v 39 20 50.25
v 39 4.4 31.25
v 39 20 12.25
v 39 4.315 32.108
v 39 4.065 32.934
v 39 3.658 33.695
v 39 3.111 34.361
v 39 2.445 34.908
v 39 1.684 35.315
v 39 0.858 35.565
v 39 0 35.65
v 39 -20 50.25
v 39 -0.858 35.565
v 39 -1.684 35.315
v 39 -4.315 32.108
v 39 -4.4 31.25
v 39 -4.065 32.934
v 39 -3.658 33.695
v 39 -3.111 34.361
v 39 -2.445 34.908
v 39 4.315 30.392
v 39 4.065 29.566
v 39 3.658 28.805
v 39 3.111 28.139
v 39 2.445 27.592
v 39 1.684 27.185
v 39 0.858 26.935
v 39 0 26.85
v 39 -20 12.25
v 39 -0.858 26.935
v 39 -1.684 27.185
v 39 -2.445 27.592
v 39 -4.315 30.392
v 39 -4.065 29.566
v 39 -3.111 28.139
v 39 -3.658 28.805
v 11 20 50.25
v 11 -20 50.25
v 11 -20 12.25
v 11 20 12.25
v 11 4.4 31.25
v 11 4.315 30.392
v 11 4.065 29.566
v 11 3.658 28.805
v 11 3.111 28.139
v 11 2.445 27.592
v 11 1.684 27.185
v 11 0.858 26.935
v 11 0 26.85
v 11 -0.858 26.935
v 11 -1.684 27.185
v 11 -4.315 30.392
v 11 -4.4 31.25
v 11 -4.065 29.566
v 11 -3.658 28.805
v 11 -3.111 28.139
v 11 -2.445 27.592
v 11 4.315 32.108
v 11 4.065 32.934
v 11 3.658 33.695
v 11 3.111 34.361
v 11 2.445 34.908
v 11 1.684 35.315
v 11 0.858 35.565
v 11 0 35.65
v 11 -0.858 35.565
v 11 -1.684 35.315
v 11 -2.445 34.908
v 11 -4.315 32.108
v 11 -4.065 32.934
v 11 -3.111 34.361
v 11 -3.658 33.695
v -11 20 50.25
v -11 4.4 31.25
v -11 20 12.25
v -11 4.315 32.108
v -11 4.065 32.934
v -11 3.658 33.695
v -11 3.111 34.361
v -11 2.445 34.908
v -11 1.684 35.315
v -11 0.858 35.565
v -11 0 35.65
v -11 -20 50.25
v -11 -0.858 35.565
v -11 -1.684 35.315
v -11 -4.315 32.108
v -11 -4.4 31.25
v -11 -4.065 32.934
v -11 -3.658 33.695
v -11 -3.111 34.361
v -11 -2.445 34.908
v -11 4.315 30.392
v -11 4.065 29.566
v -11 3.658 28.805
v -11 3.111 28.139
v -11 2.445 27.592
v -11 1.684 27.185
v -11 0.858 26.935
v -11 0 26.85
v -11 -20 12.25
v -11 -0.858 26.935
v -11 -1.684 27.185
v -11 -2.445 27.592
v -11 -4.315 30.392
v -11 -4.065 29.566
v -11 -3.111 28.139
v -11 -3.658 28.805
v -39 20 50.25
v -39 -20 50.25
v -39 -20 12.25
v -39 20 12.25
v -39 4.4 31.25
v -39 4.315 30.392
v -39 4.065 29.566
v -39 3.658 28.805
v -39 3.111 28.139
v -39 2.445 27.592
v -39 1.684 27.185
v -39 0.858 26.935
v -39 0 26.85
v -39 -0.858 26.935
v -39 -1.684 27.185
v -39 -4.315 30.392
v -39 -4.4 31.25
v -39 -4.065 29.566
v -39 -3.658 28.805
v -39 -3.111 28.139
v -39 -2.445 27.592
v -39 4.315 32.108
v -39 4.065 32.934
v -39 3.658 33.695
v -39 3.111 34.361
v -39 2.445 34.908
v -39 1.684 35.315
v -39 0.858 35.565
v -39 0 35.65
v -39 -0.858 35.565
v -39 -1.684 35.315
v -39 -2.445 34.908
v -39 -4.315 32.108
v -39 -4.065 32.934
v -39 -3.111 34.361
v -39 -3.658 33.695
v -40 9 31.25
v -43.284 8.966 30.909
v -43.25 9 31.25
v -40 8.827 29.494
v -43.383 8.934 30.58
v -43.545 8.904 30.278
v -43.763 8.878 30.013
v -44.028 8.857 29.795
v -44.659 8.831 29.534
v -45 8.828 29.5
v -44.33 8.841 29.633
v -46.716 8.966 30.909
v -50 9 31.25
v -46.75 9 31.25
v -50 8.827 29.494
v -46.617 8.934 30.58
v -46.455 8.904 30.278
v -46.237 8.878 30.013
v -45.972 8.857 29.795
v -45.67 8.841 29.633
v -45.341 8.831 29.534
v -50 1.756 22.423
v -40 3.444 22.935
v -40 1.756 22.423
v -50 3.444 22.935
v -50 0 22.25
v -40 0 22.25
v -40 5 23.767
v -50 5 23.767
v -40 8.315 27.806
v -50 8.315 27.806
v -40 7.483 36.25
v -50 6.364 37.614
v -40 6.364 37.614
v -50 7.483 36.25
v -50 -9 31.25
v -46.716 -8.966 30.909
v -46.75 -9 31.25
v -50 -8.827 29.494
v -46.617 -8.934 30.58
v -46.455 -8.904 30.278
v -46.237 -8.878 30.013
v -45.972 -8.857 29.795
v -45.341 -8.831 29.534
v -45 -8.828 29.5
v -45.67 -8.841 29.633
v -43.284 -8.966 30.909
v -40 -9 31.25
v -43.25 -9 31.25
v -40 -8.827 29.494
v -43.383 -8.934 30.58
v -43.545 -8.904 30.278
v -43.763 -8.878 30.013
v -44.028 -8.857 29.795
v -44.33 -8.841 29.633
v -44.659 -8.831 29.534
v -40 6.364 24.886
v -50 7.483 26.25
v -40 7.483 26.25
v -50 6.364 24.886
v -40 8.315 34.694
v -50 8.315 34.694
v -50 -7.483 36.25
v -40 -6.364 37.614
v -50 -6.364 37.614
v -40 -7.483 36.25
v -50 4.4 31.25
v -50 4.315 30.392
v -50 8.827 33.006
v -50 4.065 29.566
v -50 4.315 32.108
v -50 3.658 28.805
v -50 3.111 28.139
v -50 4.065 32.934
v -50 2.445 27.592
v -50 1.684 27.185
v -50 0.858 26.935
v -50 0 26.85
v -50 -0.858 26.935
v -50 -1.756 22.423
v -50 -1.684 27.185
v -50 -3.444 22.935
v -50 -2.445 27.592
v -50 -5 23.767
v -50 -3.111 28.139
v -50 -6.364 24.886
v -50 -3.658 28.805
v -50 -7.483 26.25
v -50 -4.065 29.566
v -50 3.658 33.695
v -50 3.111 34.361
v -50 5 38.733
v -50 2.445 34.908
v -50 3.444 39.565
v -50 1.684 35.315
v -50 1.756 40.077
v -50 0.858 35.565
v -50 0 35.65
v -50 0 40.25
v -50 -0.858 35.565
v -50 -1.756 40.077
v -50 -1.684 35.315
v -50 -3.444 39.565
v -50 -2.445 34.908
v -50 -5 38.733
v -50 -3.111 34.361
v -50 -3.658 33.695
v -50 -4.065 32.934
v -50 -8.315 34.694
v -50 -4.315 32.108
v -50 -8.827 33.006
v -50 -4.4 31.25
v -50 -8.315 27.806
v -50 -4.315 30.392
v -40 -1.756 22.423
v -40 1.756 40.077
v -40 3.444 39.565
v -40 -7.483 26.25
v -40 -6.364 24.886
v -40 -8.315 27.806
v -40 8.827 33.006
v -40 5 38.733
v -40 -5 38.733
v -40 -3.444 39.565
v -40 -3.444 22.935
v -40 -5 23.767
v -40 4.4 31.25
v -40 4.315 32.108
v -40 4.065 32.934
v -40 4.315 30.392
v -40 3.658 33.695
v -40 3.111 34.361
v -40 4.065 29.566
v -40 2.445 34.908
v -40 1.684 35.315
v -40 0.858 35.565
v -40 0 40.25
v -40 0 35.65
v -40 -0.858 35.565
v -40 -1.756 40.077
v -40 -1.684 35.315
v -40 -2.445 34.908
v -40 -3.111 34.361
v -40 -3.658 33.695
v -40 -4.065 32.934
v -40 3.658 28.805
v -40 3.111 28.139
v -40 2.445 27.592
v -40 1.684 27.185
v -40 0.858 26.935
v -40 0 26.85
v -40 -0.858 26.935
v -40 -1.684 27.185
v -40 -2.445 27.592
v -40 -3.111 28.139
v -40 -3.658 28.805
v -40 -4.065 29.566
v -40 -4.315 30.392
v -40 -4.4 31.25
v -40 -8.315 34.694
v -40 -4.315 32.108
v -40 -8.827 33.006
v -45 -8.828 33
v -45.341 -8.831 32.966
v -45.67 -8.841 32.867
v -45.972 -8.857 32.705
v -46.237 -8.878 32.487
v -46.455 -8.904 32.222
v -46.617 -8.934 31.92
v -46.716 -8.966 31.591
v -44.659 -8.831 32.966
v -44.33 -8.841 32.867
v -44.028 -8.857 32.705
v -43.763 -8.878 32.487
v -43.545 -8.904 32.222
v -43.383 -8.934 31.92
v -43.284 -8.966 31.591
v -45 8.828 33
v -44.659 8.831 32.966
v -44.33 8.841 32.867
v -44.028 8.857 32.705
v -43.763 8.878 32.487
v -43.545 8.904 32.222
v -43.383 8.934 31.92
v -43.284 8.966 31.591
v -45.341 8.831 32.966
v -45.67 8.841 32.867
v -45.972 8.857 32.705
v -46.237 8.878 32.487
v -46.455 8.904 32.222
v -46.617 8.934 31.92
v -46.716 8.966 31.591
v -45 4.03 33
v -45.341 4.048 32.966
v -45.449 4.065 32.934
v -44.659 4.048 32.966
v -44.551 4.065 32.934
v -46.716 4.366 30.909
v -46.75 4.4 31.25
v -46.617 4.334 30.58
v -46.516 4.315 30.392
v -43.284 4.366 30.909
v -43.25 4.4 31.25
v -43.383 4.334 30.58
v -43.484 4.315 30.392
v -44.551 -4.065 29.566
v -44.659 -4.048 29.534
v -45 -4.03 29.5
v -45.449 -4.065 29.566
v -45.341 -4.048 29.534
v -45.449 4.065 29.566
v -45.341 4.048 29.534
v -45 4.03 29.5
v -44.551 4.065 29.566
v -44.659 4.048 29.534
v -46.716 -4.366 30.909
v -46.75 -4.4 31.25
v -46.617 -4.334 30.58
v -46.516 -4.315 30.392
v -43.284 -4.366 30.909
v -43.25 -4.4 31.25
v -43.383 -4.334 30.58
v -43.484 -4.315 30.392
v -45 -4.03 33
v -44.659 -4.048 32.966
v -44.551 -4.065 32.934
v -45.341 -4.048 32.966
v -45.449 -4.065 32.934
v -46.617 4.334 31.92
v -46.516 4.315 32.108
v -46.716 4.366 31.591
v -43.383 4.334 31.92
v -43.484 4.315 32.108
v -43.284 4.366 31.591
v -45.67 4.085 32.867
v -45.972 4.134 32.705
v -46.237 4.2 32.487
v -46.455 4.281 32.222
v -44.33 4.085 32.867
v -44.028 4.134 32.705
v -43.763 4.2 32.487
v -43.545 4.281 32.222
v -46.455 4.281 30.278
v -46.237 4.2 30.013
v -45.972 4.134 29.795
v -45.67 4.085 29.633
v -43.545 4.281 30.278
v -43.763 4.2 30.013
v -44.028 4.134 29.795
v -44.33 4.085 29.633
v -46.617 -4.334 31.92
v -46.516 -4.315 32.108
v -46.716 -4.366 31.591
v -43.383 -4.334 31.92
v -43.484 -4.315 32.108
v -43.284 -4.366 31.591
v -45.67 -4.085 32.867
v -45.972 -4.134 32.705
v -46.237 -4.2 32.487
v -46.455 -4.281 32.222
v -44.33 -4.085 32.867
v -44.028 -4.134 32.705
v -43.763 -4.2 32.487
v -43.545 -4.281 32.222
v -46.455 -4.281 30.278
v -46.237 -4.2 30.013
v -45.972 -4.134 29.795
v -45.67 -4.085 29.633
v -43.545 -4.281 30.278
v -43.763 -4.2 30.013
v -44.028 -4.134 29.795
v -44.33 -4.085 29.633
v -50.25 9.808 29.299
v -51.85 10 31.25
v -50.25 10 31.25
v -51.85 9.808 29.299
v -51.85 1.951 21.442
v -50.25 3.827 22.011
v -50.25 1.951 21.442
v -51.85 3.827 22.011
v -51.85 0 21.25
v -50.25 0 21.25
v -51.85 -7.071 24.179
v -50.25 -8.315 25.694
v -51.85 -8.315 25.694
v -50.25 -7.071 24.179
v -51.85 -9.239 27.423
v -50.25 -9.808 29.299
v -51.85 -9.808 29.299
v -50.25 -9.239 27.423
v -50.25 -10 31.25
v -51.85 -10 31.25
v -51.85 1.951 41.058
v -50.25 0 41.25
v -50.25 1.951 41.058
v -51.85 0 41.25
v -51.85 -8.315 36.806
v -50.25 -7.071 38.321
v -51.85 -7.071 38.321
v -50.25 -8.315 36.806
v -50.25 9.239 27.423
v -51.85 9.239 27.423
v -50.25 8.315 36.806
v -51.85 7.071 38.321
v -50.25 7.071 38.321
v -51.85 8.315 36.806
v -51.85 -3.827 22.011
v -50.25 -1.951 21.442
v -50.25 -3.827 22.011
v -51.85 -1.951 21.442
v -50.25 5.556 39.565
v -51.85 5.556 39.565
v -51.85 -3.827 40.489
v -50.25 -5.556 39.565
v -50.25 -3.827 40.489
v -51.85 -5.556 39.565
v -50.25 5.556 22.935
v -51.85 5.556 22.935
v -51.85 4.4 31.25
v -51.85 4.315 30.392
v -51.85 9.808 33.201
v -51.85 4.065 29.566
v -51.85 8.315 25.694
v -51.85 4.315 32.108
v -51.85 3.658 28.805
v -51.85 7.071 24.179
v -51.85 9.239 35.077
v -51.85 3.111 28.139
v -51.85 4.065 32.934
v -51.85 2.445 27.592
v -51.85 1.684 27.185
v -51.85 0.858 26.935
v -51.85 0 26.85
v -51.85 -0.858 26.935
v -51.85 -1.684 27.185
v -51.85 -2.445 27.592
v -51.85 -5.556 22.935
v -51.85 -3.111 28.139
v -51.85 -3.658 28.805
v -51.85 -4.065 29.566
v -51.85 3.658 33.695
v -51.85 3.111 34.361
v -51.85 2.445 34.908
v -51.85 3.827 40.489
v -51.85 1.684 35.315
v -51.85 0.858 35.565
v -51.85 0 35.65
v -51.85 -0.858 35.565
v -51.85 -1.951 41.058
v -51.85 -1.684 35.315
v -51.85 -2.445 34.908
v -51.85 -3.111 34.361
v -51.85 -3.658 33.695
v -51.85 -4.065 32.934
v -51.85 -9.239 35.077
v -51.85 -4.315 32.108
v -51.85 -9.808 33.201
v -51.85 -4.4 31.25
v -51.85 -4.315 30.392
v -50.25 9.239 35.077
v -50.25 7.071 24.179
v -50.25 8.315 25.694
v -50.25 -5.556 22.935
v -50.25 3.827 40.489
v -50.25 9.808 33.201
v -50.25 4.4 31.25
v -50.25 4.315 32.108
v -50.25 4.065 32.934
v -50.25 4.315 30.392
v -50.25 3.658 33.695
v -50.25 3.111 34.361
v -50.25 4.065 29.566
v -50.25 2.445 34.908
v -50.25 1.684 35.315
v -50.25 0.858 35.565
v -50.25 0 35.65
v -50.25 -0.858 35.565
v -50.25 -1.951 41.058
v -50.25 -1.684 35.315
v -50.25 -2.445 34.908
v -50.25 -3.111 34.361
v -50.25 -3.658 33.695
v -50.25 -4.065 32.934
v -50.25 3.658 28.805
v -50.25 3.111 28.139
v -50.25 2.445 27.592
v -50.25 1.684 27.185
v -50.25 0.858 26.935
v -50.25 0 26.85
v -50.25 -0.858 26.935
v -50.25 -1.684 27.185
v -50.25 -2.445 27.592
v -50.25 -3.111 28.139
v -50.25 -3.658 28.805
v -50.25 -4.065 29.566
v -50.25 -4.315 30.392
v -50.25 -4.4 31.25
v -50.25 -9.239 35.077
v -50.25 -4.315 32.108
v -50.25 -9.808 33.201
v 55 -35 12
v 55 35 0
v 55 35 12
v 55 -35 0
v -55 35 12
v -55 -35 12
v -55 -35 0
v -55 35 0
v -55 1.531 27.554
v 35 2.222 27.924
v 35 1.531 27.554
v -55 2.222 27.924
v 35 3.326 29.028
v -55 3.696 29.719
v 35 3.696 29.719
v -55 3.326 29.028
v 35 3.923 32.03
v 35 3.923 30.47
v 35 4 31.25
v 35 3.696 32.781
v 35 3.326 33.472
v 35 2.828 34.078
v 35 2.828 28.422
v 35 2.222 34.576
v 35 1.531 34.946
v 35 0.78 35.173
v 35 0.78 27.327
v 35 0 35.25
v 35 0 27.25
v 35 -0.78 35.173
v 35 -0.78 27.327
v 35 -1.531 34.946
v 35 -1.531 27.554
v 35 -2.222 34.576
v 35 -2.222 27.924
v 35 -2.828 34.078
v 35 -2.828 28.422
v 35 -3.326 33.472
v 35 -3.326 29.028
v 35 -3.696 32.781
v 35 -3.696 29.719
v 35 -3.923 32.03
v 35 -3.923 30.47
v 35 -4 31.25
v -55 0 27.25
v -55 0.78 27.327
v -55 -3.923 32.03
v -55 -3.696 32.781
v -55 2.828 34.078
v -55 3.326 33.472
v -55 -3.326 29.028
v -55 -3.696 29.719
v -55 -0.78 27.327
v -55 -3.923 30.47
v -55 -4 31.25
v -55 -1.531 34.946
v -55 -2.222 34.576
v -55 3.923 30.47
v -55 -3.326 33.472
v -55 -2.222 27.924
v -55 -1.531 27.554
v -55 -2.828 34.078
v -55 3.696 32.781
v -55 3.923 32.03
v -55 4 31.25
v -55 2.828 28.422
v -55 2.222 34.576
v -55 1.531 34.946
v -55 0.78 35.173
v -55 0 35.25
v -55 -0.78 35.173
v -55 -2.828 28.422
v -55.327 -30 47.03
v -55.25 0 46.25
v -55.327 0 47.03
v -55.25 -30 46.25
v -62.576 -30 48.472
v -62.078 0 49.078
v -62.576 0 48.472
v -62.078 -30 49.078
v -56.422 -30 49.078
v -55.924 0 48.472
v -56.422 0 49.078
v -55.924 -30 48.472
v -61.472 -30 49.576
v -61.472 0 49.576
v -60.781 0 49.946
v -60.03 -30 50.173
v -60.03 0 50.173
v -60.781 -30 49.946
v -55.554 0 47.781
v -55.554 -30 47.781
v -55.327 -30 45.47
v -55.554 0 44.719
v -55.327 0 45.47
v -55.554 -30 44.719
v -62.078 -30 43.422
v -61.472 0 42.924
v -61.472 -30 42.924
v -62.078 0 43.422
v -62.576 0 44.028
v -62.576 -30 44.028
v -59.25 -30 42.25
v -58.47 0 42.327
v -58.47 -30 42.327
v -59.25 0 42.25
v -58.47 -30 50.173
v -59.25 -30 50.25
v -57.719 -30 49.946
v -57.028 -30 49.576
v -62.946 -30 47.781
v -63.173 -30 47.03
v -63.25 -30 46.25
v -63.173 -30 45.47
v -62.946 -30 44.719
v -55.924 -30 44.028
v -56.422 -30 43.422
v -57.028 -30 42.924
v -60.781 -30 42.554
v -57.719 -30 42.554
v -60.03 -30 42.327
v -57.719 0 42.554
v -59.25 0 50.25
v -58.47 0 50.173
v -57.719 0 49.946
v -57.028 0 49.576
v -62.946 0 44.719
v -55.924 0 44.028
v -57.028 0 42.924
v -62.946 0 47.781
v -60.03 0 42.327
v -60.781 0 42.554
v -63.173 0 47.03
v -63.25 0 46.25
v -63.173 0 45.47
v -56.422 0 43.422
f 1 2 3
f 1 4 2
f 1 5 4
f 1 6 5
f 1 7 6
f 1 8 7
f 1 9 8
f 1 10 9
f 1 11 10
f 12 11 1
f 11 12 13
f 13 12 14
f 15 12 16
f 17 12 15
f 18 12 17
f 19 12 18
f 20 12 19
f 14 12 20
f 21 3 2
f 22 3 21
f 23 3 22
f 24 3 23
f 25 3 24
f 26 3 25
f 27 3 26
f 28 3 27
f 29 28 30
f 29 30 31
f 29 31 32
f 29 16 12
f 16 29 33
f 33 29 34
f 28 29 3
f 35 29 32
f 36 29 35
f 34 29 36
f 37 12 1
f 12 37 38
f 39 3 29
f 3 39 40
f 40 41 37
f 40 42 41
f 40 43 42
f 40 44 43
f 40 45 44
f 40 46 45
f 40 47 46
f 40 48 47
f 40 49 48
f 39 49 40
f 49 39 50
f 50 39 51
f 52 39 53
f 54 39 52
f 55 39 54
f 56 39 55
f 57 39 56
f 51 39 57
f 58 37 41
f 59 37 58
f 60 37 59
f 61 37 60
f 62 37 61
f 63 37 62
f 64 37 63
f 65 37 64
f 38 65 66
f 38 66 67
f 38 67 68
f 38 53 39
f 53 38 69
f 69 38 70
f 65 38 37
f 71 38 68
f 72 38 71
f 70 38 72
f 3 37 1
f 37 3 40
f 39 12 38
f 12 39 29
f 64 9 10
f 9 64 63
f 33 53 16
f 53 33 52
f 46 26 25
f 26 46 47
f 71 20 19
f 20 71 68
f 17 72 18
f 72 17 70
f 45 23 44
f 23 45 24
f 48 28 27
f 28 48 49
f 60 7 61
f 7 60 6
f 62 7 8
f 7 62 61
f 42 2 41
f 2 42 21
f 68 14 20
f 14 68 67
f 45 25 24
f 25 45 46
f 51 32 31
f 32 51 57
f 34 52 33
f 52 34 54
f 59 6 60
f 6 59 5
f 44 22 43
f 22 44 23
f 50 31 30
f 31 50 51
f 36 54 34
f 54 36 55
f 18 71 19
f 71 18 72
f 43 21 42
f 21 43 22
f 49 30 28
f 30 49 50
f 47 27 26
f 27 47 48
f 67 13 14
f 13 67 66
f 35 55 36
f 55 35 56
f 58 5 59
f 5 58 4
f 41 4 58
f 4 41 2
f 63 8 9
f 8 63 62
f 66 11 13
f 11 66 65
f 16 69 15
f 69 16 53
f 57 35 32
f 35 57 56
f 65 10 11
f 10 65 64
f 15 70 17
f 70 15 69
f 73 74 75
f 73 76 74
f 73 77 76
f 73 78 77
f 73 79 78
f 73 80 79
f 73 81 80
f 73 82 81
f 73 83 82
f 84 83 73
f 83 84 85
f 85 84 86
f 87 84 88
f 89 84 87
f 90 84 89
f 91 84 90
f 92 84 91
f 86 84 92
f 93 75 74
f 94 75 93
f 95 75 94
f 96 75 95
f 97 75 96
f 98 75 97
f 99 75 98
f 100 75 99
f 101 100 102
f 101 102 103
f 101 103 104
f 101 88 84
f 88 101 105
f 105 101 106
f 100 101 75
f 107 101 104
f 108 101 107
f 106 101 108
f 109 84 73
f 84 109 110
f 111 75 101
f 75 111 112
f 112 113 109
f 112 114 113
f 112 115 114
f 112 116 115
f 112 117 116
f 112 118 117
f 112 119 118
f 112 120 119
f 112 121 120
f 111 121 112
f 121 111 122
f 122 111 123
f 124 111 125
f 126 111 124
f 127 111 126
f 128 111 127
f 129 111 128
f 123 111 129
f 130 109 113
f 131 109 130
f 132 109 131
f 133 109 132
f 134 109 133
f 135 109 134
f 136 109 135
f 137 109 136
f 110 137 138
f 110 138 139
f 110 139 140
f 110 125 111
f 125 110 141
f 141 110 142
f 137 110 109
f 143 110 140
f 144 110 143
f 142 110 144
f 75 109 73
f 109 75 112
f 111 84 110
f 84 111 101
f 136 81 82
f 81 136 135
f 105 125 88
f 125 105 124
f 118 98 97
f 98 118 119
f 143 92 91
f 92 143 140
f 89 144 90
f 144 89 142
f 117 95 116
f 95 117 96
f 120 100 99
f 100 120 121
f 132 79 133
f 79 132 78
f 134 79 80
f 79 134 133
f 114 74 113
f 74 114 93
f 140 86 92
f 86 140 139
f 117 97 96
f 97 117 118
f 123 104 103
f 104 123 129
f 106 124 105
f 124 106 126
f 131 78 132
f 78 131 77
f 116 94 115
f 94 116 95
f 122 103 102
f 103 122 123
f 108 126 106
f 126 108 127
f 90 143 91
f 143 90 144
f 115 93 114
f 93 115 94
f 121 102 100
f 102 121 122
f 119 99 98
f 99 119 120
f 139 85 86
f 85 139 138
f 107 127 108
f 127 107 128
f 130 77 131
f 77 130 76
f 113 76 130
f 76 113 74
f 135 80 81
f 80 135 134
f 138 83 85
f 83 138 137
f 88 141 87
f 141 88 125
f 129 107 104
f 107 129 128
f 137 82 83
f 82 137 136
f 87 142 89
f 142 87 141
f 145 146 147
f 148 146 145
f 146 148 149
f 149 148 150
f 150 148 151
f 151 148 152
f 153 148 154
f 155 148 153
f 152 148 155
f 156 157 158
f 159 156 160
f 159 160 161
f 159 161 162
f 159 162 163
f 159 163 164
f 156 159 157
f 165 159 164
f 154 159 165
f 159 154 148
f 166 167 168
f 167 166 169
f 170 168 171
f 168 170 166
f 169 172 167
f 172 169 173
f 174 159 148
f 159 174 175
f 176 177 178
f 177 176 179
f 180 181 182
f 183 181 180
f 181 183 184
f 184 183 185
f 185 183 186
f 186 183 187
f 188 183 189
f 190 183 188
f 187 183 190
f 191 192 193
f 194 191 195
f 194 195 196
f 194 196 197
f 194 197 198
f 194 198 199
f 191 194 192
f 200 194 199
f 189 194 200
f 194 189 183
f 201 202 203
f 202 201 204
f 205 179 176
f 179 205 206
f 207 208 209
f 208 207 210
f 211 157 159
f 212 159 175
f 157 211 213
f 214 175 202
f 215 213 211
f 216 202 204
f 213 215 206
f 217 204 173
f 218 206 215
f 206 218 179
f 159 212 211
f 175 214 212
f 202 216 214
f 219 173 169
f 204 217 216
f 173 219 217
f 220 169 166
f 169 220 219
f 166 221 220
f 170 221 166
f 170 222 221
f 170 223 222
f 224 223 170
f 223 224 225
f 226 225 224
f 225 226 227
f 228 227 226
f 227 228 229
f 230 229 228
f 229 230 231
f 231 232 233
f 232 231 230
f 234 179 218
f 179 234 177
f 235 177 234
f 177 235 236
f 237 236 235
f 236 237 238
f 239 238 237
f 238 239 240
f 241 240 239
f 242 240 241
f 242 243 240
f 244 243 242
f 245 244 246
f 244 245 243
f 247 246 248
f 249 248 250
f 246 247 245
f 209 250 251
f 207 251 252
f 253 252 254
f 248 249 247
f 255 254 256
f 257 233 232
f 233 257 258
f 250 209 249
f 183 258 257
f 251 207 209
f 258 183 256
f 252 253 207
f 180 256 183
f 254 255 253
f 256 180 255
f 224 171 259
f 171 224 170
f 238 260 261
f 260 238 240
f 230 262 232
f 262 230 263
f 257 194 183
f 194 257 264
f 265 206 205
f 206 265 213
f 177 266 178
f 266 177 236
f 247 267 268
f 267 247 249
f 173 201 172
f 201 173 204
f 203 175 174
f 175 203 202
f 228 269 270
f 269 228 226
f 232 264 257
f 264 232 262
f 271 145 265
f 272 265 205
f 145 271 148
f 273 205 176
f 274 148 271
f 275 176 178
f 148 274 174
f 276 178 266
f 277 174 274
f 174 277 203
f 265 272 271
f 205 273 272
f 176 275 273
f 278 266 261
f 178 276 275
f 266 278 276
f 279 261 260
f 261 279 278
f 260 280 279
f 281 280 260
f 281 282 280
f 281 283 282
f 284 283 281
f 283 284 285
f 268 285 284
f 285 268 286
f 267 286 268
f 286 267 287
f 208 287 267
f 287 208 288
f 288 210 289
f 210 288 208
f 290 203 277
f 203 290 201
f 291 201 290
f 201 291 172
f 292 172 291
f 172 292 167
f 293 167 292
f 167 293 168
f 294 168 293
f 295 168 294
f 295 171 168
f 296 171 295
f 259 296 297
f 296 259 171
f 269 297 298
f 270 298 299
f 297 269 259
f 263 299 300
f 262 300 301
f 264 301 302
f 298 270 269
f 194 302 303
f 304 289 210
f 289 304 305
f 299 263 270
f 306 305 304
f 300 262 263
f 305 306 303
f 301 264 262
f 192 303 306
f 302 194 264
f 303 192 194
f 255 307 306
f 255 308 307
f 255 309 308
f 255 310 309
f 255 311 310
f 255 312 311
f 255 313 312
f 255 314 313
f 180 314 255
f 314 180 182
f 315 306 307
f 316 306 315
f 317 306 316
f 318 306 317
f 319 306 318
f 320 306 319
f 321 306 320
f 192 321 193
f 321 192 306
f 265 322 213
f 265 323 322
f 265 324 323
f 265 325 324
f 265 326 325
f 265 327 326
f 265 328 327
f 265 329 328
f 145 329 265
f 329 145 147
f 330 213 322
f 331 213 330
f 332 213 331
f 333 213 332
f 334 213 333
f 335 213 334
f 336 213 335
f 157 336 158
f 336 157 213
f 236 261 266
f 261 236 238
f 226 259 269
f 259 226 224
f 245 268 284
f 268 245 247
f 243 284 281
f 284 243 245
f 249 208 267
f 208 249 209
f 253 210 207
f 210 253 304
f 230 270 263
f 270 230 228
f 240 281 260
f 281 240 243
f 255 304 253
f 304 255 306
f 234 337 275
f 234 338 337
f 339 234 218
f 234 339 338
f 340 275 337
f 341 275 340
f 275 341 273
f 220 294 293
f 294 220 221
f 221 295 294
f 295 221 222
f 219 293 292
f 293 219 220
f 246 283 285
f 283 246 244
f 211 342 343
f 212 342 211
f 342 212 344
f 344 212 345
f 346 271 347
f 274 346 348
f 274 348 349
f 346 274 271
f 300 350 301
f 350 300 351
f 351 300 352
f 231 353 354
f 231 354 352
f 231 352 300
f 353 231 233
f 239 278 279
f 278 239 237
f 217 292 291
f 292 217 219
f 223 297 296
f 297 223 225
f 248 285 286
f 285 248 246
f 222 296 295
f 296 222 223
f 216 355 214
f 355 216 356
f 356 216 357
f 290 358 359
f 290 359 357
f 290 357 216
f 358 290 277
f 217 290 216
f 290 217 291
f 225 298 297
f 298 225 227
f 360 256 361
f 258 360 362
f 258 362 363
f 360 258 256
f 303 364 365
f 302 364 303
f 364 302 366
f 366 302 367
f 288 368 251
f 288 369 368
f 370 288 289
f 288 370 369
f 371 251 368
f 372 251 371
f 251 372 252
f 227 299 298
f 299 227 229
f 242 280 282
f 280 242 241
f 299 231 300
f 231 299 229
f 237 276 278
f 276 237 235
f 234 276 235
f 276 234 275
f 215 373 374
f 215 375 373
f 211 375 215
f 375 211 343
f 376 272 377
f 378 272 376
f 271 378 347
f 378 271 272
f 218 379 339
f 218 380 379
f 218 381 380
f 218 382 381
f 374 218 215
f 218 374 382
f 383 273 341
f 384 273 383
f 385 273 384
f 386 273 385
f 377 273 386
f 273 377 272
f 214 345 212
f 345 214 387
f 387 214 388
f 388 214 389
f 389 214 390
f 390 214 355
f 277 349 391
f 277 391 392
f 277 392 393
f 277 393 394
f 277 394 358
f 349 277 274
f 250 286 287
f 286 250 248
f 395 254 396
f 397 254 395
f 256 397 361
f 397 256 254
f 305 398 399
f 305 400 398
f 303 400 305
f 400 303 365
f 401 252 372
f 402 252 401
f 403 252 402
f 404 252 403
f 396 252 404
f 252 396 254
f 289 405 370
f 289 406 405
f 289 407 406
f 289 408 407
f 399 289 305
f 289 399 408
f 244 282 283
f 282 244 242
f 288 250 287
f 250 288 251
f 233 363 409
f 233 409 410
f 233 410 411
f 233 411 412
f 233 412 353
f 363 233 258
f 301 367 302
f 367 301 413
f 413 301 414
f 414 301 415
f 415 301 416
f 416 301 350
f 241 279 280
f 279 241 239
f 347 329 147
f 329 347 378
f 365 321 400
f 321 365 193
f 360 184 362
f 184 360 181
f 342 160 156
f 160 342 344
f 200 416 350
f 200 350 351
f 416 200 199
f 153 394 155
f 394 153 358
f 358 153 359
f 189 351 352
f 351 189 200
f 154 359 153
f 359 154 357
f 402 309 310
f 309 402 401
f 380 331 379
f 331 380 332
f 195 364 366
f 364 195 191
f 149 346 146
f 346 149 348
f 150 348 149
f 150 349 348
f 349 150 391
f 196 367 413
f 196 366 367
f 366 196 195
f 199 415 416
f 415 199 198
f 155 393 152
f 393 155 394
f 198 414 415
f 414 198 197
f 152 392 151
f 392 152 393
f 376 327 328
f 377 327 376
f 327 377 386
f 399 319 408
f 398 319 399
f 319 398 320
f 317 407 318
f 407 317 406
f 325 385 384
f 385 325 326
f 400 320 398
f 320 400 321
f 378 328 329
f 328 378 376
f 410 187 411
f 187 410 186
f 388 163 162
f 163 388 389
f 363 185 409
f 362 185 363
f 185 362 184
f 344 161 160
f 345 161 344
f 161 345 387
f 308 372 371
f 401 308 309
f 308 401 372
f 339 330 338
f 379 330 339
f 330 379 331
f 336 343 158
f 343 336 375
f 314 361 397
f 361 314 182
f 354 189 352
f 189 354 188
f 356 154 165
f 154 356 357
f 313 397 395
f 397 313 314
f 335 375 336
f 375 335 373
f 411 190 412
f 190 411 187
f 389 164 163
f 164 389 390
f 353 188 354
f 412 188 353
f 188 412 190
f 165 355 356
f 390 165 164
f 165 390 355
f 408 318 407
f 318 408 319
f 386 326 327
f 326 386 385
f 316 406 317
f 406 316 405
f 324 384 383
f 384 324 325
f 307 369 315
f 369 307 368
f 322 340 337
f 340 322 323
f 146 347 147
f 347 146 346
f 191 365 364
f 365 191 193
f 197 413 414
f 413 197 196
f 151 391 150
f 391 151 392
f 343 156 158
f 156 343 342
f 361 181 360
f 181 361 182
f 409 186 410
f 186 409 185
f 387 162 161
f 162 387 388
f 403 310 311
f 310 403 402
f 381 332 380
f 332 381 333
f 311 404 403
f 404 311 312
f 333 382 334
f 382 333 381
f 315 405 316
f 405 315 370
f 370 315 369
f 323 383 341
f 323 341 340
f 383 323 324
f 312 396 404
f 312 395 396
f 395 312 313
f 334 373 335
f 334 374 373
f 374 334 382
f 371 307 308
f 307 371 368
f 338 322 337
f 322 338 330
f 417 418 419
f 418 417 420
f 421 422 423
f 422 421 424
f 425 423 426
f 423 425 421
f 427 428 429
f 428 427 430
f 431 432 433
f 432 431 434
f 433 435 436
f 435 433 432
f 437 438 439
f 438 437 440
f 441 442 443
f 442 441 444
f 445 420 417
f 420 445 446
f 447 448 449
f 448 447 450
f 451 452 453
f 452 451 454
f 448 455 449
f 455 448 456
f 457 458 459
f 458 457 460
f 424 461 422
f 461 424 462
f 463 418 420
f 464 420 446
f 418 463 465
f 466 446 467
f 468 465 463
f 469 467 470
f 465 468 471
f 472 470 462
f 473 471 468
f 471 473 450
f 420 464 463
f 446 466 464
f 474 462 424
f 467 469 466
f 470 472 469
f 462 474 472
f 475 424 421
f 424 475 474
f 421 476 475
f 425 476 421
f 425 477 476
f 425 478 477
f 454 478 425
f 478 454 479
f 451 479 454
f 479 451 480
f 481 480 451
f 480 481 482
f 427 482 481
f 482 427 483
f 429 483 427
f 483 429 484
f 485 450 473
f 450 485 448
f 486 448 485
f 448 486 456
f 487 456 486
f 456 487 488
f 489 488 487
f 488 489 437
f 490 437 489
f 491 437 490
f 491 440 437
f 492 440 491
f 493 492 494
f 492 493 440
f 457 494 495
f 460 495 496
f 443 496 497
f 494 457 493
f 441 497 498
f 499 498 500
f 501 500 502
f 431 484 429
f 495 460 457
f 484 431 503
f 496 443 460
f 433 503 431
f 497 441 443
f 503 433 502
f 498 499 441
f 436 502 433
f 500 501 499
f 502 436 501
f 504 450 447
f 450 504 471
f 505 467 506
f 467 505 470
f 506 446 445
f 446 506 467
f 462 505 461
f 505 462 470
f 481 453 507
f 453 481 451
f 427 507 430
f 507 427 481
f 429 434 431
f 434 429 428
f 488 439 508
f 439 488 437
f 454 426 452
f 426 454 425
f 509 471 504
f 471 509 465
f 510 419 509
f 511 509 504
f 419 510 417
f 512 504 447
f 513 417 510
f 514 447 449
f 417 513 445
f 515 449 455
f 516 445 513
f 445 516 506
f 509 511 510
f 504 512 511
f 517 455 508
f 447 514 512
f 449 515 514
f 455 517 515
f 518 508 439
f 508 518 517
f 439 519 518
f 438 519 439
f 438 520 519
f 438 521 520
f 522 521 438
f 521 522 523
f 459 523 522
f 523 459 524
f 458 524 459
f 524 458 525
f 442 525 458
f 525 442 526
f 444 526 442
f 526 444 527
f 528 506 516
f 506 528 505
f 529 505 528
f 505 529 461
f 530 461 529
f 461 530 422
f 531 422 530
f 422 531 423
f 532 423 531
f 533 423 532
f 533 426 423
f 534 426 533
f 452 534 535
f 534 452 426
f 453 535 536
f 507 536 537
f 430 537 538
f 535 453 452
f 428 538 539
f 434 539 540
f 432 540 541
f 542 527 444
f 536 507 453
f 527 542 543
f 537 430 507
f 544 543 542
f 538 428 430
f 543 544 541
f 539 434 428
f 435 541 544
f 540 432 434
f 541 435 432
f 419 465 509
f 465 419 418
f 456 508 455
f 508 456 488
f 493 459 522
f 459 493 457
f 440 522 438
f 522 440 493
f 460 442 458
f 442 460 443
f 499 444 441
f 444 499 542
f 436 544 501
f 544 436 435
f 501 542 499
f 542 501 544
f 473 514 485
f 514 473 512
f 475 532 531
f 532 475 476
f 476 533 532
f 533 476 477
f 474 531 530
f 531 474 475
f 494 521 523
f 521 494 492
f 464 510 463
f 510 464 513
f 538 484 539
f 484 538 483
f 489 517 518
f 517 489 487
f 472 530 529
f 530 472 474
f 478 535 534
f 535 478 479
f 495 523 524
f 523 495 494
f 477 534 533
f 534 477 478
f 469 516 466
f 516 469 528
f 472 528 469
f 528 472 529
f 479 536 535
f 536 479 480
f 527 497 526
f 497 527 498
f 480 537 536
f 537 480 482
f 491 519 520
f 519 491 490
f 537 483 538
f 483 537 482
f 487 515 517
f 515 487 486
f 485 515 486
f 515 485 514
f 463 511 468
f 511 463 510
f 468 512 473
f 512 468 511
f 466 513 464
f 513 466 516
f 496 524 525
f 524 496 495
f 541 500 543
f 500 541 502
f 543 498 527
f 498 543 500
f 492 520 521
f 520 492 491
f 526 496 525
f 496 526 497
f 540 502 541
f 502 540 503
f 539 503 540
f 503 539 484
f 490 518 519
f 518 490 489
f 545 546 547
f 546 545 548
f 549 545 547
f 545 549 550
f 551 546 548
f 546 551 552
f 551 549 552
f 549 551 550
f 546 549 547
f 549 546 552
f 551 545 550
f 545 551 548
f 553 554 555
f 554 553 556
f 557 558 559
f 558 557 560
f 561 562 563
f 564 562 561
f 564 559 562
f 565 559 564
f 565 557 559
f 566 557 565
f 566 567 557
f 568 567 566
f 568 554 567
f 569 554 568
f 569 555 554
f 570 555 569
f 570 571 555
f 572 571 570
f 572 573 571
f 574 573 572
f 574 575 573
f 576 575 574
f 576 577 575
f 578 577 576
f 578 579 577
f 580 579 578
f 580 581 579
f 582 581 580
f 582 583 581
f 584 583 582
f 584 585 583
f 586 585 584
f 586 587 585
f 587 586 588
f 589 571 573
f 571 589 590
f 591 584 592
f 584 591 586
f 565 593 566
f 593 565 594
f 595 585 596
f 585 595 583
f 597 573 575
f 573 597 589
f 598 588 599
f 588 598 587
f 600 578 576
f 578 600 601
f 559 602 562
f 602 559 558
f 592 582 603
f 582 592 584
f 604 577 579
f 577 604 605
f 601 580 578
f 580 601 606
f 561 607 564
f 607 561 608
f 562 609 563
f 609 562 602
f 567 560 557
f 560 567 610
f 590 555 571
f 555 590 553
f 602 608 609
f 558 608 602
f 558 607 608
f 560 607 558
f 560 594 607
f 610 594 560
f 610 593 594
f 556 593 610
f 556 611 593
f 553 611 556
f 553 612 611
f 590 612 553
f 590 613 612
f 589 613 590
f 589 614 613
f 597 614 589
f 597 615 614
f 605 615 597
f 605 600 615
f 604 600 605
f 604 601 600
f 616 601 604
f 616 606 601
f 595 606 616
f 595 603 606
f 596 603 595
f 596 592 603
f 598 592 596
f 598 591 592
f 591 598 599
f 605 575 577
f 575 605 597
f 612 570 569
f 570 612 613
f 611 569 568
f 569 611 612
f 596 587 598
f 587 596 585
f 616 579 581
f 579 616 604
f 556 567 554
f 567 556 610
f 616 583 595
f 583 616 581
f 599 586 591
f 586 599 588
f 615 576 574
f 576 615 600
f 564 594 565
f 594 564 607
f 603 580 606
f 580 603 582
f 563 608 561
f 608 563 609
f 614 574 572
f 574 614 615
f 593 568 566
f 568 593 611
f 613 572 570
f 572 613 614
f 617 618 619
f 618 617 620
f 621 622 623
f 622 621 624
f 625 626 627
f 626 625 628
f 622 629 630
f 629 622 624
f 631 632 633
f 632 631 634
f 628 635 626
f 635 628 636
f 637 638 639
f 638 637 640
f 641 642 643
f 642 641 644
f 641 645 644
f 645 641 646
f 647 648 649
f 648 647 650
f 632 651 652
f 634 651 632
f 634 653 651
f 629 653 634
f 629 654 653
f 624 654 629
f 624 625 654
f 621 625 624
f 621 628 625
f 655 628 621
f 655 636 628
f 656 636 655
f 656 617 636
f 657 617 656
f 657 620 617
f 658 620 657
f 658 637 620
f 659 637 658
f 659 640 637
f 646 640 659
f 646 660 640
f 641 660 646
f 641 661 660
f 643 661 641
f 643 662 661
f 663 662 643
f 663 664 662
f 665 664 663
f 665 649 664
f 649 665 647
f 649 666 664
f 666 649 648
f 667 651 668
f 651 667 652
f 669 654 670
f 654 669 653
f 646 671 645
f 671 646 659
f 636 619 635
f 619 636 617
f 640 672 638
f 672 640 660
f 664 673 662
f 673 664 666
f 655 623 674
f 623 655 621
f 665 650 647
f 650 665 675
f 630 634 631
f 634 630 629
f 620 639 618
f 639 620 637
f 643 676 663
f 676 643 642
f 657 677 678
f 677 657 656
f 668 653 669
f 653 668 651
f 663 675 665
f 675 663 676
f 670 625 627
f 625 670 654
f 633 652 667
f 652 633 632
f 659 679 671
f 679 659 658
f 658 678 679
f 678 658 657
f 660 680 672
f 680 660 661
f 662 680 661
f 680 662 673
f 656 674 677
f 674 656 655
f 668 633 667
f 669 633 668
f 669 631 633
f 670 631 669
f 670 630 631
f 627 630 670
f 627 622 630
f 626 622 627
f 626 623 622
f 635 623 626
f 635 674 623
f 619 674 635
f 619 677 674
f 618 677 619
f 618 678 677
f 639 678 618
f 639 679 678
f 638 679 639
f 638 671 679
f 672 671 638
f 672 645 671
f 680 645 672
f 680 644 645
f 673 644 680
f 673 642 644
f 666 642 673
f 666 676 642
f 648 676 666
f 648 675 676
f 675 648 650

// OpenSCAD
$fn = 32;

// ------------------------------------------------------------------------
// Machine vise: screw d8, jaws 28 x 38 mm
// Every part is its own module, assembly() places every instance.
// ------------------------------------------------------------------------

// --- part 1 ---
module vise_bed() {
  difference() {
    translate([-55, -35, 0]) cube([110, 70, 12]);
  }
}

// --- part 2 ---
module vise_jaw() {
  difference() {
    translate([-14, -20, 0]) cube([28, 40, 38]);
    translate([0, 0, 19]) rotate([0, 90, 0]) cylinder(h = 30, d = 8.8, center = true);
  }
}

// --- part 3 ---
module vise_screw() {
  translate([0, 0, -45]) cylinder(h = 90, d = 8);
}

// --- part 4 ---
module screw_collar() {
  difference() {
    cylinder(h = 10, d = 18);
    translate([0, 0, -1]) cylinder(h = 12, d = 8.8);
    translate([0, 0, 5]) rotate([90, 0, 0]) cylinder(h = 20, d = 3.5, center = true);
  }
}

// --- part 5 ---
module screw_washer() {
  difference() {
      translate([0, 0, 0]) cylinder(h = 1.6, d = 20);
      translate([0, 0, -1]) cylinder(h = 3.6, d = 8.8);
    }
}

// --- part 6 ---
module vise_handle() {
  cylinder(h = 30, d = 8);
}

// --- assembly ---
module assembly() {
  color([0.80, 0.24, 0.20]) translate([0, 0, 0]) rotate([0, 0, 0]) vise_bed();
  color([0.20, 0.45, 0.75]) translate([25, 0, 12.25]) rotate([0, 0, 0]) vise_jaw();
  color([0.25, 0.62, 0.32]) translate([-25, 0, 12.25]) rotate([0, 0, 0]) vise_jaw();
  color([0.92, 0.70, 0.18]) translate([-10, 0, 31.25]) rotate([0, 90, 0]) vise_screw();
  color([0.58, 0.35, 0.70]) translate([-50, 0, 31.25]) rotate([0, 90, 0]) screw_collar();
  color([0.16, 0.66, 0.66]) translate([-51.85, 0, 31.25]) rotate([0, 90, 0]) screw_washer();
  color([0.85, 0.48, 0.18]) translate([-59.25, 0, 46.25]) rotate([90, 0, 0]) vise_handle();
}

assembly();
